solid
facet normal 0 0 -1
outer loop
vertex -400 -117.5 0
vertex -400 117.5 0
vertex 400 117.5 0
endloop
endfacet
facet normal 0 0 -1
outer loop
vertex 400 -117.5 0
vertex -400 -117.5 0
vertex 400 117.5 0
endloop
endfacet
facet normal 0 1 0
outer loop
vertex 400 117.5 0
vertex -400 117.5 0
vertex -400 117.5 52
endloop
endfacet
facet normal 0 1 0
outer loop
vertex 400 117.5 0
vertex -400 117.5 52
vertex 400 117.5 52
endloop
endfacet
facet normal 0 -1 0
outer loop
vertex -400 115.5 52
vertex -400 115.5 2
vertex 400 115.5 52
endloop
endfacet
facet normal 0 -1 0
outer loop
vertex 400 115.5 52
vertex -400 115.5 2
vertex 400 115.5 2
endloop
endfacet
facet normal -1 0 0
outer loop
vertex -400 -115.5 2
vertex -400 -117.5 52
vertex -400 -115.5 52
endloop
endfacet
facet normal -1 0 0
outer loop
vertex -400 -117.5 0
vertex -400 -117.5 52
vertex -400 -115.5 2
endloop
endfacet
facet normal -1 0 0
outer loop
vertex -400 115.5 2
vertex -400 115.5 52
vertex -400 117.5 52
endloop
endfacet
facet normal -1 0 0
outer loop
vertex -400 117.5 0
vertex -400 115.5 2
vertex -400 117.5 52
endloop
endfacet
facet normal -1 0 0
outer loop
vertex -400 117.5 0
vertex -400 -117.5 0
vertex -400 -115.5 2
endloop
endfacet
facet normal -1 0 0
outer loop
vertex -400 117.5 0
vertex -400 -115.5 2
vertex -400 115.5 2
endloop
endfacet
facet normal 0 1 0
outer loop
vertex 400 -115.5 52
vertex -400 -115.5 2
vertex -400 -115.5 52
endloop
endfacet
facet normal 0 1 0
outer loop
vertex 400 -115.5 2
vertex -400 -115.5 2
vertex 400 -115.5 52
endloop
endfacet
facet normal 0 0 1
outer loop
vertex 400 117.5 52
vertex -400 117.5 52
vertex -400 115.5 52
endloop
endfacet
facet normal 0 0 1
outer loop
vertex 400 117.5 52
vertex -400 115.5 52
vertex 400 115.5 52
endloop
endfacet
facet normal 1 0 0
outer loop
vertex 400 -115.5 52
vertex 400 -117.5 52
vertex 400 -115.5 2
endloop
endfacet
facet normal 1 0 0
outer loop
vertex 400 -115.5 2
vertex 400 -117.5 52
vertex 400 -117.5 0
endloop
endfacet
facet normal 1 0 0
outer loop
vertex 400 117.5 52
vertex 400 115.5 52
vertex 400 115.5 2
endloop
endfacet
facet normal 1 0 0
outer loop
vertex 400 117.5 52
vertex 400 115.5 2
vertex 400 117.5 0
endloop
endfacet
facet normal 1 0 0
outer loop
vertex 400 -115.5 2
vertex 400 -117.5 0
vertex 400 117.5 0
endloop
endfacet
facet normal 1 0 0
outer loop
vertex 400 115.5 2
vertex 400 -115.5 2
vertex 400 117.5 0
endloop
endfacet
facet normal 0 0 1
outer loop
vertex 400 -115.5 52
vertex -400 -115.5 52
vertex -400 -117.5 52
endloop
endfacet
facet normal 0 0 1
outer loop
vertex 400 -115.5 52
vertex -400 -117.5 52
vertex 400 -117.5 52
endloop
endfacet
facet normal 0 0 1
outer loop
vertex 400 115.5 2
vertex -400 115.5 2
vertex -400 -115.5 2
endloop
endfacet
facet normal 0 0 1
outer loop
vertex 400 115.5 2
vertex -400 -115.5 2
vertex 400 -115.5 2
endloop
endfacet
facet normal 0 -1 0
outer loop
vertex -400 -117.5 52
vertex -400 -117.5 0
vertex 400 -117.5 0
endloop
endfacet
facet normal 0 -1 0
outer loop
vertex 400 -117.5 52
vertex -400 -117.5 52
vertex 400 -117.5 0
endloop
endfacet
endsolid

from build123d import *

# Parameters (mm, degrees)
SKETCH_W     = 800
SKETCH_H     = 235
PAD_DEPTH    = 2
SKETCH001_W  = 800
SKETCH001_H  = 2
PAD001_DEPTH = 50


with BuildPart() as part:
    # Sketch → Pad (new body)
    with BuildSketch(Plane.XY):
        Rectangle(SKETCH_W, SKETCH_H)
    extrude(amount=PAD_DEPTH)

    # Sketch001 (on Face6 of Pad) → Pad001 (join)
    with BuildSketch(Plane.XY.offset(2)):
        with Locations((0, 116.5)):
            Rectangle(SKETCH001_W, SKETCH001_H)
        with Locations((0, -116.5)):
            Rectangle(SKETCH001_W, SKETCH001_H)
    extrude(amount=PAD001_DEPTH)


solid = part.part
